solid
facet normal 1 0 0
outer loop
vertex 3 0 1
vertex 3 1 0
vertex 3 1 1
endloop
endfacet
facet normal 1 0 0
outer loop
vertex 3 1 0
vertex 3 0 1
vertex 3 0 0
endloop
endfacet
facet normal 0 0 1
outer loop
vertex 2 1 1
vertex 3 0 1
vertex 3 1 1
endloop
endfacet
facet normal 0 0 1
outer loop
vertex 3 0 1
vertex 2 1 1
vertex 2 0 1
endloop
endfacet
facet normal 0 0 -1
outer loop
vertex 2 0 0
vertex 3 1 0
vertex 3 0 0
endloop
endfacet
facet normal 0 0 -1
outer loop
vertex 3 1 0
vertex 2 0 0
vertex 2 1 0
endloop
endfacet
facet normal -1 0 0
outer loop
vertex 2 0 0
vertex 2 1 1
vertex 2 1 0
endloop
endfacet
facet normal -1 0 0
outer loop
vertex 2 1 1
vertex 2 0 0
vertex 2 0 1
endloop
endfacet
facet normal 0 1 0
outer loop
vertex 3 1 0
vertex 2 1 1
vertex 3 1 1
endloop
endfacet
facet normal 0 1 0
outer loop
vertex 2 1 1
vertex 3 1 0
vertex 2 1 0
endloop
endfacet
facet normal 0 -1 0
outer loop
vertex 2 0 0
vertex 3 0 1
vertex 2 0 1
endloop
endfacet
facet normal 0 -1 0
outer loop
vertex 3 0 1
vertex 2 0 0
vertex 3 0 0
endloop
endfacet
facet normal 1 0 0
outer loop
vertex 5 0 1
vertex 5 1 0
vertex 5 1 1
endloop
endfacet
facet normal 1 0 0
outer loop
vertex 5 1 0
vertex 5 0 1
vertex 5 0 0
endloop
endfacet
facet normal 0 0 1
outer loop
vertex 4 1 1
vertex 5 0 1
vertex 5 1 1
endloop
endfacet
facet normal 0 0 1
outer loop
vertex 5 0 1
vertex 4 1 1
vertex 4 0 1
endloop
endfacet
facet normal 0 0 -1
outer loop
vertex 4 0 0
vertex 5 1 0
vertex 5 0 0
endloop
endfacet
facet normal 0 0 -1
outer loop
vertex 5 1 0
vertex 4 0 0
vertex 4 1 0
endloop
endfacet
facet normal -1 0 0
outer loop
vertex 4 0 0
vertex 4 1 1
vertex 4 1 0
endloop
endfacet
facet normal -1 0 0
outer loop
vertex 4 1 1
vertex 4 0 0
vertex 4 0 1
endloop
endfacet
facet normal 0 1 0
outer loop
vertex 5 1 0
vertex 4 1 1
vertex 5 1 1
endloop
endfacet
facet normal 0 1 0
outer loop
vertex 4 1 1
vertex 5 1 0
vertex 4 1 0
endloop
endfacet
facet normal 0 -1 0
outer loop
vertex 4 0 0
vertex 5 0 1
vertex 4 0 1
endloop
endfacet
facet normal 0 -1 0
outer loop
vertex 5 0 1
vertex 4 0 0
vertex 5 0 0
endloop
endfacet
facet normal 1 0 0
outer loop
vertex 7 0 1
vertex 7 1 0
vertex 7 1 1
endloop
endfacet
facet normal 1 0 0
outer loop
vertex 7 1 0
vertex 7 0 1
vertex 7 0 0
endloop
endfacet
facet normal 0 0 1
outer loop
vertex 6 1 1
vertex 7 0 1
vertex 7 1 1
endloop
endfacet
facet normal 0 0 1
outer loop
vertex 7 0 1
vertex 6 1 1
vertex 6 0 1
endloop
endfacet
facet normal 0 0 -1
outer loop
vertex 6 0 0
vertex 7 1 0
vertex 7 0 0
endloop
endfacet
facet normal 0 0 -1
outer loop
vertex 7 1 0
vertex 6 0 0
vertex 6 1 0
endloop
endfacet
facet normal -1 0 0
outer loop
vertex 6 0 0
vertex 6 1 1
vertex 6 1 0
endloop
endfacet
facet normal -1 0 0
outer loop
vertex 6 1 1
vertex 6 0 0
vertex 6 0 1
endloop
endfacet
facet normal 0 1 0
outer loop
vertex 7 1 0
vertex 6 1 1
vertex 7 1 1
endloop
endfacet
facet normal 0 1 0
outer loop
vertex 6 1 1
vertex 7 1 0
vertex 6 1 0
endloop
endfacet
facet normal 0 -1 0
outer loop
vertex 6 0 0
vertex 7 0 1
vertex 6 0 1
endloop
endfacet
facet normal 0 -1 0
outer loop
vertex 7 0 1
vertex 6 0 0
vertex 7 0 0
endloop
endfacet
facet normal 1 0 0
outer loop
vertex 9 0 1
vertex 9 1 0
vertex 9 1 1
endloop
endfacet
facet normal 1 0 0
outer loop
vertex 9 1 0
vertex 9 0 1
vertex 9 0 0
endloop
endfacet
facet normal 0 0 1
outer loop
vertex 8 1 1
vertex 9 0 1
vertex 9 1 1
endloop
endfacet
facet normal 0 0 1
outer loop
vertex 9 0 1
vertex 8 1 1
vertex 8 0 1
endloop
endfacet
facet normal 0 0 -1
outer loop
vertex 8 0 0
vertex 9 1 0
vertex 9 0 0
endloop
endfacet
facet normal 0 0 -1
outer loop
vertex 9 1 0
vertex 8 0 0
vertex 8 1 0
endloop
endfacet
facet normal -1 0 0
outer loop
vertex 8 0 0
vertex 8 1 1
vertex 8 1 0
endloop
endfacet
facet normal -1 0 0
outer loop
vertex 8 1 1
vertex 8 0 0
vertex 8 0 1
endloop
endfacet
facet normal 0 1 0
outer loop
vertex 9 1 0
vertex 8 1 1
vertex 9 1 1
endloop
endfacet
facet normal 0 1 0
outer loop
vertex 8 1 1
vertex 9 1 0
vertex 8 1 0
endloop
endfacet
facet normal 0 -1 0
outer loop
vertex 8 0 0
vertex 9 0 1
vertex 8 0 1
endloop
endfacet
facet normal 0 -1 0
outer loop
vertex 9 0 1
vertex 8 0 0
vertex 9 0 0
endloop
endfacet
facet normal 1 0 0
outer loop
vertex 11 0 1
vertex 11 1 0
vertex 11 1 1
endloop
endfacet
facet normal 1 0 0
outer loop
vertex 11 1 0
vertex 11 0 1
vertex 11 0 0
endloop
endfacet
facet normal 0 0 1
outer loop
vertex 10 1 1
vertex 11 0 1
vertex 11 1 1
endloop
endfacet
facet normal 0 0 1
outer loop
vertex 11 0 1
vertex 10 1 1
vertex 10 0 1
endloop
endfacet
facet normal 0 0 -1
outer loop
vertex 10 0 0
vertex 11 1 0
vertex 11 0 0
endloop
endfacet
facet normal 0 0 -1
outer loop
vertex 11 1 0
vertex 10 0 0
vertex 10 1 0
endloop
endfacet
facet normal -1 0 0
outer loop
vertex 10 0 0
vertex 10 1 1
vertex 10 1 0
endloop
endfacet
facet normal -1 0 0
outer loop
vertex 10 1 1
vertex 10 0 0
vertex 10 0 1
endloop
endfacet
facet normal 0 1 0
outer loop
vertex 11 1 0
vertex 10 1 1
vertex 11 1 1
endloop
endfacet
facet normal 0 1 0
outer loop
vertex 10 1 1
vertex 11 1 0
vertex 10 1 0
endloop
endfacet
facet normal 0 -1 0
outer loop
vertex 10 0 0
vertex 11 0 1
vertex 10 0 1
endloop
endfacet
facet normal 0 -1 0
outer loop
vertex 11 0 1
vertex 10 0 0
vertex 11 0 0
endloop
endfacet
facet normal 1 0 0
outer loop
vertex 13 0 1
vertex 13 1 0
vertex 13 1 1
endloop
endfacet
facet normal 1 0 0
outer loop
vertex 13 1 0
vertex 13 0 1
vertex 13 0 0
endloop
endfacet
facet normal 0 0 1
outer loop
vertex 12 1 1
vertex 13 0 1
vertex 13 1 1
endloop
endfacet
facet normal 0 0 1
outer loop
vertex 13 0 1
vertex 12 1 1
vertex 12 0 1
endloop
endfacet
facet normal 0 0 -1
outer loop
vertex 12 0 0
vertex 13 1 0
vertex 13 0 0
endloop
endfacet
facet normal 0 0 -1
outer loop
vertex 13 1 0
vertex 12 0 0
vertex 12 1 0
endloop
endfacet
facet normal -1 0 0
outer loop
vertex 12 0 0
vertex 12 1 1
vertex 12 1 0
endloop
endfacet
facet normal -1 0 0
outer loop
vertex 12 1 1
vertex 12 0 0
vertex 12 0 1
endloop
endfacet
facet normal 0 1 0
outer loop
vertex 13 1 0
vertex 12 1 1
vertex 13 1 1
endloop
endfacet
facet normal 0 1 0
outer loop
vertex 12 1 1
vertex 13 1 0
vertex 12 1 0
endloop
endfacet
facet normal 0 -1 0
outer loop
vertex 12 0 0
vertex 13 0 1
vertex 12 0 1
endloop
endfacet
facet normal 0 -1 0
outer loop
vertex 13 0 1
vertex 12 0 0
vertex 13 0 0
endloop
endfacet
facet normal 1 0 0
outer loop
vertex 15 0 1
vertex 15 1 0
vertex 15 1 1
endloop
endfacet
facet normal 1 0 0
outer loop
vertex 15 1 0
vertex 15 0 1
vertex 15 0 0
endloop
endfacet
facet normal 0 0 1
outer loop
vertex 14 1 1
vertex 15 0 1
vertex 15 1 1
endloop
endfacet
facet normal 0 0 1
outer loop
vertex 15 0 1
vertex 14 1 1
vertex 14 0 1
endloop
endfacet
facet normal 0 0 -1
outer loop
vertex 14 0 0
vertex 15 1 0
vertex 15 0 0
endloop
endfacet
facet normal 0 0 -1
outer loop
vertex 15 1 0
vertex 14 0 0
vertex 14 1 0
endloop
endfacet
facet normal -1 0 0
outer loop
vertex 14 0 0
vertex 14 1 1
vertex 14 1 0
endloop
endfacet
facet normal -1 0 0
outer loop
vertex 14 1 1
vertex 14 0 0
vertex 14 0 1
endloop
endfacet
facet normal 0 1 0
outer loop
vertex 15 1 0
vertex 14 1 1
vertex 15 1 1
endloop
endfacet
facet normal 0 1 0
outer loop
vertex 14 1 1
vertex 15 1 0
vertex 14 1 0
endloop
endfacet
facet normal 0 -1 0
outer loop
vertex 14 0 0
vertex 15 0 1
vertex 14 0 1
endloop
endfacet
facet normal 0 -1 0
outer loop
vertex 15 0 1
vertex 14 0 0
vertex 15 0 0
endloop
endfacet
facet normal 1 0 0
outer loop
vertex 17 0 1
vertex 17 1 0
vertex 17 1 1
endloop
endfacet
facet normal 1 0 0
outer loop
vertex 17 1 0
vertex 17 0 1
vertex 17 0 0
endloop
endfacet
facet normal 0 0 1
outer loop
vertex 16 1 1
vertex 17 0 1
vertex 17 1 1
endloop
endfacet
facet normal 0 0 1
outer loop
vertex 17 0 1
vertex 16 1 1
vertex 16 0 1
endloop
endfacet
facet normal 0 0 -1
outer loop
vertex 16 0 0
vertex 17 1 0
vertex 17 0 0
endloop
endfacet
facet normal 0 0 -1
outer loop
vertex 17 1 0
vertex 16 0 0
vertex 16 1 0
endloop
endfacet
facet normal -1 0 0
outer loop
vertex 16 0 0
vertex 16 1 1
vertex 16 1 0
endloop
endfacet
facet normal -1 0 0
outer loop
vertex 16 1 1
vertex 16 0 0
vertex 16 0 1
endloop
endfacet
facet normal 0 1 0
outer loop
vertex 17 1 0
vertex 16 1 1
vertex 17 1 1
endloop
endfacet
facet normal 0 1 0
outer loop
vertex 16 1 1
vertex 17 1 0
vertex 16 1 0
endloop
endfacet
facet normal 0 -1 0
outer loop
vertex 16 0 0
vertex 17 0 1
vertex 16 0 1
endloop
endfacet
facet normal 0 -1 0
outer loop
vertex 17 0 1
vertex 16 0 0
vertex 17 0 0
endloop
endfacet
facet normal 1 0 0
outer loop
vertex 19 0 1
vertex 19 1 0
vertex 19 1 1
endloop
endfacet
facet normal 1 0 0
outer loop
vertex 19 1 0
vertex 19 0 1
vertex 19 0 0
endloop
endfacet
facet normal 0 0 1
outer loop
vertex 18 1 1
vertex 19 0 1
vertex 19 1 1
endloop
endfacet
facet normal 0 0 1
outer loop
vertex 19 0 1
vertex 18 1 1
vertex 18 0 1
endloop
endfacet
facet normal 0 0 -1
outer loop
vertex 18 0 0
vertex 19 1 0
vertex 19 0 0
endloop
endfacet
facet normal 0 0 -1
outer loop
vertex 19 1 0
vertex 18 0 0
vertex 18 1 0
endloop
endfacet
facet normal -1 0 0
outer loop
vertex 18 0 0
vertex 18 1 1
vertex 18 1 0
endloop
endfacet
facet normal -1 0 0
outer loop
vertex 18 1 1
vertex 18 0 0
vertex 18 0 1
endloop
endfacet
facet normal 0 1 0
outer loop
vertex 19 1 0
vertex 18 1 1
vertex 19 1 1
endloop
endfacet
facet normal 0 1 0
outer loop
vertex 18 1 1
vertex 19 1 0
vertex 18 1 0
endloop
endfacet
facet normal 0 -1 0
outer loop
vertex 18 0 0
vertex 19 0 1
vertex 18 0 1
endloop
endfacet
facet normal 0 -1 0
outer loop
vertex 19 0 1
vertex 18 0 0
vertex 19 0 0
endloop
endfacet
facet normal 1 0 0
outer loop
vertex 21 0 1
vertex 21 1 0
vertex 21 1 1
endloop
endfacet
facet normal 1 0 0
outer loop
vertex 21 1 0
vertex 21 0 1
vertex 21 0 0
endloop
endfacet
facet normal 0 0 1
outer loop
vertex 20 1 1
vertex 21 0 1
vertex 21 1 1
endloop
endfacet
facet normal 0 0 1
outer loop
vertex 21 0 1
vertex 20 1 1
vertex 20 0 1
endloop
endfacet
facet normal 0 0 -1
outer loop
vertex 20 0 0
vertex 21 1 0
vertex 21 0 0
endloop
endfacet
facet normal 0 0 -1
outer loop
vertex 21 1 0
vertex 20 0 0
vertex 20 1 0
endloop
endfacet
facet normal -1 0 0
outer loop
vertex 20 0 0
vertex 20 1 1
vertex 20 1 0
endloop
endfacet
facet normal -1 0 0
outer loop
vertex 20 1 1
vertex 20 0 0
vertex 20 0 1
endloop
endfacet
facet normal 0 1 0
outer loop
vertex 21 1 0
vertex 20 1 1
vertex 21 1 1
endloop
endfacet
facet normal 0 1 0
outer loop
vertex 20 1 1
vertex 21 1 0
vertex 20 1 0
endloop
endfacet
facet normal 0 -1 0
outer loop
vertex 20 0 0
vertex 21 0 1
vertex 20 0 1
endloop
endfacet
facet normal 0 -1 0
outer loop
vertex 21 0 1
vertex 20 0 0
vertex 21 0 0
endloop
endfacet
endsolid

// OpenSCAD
$fn=15;

for(i=[1:10]){ 
	translate([i*2,0,0]) cube([1,1,1]);
}	
